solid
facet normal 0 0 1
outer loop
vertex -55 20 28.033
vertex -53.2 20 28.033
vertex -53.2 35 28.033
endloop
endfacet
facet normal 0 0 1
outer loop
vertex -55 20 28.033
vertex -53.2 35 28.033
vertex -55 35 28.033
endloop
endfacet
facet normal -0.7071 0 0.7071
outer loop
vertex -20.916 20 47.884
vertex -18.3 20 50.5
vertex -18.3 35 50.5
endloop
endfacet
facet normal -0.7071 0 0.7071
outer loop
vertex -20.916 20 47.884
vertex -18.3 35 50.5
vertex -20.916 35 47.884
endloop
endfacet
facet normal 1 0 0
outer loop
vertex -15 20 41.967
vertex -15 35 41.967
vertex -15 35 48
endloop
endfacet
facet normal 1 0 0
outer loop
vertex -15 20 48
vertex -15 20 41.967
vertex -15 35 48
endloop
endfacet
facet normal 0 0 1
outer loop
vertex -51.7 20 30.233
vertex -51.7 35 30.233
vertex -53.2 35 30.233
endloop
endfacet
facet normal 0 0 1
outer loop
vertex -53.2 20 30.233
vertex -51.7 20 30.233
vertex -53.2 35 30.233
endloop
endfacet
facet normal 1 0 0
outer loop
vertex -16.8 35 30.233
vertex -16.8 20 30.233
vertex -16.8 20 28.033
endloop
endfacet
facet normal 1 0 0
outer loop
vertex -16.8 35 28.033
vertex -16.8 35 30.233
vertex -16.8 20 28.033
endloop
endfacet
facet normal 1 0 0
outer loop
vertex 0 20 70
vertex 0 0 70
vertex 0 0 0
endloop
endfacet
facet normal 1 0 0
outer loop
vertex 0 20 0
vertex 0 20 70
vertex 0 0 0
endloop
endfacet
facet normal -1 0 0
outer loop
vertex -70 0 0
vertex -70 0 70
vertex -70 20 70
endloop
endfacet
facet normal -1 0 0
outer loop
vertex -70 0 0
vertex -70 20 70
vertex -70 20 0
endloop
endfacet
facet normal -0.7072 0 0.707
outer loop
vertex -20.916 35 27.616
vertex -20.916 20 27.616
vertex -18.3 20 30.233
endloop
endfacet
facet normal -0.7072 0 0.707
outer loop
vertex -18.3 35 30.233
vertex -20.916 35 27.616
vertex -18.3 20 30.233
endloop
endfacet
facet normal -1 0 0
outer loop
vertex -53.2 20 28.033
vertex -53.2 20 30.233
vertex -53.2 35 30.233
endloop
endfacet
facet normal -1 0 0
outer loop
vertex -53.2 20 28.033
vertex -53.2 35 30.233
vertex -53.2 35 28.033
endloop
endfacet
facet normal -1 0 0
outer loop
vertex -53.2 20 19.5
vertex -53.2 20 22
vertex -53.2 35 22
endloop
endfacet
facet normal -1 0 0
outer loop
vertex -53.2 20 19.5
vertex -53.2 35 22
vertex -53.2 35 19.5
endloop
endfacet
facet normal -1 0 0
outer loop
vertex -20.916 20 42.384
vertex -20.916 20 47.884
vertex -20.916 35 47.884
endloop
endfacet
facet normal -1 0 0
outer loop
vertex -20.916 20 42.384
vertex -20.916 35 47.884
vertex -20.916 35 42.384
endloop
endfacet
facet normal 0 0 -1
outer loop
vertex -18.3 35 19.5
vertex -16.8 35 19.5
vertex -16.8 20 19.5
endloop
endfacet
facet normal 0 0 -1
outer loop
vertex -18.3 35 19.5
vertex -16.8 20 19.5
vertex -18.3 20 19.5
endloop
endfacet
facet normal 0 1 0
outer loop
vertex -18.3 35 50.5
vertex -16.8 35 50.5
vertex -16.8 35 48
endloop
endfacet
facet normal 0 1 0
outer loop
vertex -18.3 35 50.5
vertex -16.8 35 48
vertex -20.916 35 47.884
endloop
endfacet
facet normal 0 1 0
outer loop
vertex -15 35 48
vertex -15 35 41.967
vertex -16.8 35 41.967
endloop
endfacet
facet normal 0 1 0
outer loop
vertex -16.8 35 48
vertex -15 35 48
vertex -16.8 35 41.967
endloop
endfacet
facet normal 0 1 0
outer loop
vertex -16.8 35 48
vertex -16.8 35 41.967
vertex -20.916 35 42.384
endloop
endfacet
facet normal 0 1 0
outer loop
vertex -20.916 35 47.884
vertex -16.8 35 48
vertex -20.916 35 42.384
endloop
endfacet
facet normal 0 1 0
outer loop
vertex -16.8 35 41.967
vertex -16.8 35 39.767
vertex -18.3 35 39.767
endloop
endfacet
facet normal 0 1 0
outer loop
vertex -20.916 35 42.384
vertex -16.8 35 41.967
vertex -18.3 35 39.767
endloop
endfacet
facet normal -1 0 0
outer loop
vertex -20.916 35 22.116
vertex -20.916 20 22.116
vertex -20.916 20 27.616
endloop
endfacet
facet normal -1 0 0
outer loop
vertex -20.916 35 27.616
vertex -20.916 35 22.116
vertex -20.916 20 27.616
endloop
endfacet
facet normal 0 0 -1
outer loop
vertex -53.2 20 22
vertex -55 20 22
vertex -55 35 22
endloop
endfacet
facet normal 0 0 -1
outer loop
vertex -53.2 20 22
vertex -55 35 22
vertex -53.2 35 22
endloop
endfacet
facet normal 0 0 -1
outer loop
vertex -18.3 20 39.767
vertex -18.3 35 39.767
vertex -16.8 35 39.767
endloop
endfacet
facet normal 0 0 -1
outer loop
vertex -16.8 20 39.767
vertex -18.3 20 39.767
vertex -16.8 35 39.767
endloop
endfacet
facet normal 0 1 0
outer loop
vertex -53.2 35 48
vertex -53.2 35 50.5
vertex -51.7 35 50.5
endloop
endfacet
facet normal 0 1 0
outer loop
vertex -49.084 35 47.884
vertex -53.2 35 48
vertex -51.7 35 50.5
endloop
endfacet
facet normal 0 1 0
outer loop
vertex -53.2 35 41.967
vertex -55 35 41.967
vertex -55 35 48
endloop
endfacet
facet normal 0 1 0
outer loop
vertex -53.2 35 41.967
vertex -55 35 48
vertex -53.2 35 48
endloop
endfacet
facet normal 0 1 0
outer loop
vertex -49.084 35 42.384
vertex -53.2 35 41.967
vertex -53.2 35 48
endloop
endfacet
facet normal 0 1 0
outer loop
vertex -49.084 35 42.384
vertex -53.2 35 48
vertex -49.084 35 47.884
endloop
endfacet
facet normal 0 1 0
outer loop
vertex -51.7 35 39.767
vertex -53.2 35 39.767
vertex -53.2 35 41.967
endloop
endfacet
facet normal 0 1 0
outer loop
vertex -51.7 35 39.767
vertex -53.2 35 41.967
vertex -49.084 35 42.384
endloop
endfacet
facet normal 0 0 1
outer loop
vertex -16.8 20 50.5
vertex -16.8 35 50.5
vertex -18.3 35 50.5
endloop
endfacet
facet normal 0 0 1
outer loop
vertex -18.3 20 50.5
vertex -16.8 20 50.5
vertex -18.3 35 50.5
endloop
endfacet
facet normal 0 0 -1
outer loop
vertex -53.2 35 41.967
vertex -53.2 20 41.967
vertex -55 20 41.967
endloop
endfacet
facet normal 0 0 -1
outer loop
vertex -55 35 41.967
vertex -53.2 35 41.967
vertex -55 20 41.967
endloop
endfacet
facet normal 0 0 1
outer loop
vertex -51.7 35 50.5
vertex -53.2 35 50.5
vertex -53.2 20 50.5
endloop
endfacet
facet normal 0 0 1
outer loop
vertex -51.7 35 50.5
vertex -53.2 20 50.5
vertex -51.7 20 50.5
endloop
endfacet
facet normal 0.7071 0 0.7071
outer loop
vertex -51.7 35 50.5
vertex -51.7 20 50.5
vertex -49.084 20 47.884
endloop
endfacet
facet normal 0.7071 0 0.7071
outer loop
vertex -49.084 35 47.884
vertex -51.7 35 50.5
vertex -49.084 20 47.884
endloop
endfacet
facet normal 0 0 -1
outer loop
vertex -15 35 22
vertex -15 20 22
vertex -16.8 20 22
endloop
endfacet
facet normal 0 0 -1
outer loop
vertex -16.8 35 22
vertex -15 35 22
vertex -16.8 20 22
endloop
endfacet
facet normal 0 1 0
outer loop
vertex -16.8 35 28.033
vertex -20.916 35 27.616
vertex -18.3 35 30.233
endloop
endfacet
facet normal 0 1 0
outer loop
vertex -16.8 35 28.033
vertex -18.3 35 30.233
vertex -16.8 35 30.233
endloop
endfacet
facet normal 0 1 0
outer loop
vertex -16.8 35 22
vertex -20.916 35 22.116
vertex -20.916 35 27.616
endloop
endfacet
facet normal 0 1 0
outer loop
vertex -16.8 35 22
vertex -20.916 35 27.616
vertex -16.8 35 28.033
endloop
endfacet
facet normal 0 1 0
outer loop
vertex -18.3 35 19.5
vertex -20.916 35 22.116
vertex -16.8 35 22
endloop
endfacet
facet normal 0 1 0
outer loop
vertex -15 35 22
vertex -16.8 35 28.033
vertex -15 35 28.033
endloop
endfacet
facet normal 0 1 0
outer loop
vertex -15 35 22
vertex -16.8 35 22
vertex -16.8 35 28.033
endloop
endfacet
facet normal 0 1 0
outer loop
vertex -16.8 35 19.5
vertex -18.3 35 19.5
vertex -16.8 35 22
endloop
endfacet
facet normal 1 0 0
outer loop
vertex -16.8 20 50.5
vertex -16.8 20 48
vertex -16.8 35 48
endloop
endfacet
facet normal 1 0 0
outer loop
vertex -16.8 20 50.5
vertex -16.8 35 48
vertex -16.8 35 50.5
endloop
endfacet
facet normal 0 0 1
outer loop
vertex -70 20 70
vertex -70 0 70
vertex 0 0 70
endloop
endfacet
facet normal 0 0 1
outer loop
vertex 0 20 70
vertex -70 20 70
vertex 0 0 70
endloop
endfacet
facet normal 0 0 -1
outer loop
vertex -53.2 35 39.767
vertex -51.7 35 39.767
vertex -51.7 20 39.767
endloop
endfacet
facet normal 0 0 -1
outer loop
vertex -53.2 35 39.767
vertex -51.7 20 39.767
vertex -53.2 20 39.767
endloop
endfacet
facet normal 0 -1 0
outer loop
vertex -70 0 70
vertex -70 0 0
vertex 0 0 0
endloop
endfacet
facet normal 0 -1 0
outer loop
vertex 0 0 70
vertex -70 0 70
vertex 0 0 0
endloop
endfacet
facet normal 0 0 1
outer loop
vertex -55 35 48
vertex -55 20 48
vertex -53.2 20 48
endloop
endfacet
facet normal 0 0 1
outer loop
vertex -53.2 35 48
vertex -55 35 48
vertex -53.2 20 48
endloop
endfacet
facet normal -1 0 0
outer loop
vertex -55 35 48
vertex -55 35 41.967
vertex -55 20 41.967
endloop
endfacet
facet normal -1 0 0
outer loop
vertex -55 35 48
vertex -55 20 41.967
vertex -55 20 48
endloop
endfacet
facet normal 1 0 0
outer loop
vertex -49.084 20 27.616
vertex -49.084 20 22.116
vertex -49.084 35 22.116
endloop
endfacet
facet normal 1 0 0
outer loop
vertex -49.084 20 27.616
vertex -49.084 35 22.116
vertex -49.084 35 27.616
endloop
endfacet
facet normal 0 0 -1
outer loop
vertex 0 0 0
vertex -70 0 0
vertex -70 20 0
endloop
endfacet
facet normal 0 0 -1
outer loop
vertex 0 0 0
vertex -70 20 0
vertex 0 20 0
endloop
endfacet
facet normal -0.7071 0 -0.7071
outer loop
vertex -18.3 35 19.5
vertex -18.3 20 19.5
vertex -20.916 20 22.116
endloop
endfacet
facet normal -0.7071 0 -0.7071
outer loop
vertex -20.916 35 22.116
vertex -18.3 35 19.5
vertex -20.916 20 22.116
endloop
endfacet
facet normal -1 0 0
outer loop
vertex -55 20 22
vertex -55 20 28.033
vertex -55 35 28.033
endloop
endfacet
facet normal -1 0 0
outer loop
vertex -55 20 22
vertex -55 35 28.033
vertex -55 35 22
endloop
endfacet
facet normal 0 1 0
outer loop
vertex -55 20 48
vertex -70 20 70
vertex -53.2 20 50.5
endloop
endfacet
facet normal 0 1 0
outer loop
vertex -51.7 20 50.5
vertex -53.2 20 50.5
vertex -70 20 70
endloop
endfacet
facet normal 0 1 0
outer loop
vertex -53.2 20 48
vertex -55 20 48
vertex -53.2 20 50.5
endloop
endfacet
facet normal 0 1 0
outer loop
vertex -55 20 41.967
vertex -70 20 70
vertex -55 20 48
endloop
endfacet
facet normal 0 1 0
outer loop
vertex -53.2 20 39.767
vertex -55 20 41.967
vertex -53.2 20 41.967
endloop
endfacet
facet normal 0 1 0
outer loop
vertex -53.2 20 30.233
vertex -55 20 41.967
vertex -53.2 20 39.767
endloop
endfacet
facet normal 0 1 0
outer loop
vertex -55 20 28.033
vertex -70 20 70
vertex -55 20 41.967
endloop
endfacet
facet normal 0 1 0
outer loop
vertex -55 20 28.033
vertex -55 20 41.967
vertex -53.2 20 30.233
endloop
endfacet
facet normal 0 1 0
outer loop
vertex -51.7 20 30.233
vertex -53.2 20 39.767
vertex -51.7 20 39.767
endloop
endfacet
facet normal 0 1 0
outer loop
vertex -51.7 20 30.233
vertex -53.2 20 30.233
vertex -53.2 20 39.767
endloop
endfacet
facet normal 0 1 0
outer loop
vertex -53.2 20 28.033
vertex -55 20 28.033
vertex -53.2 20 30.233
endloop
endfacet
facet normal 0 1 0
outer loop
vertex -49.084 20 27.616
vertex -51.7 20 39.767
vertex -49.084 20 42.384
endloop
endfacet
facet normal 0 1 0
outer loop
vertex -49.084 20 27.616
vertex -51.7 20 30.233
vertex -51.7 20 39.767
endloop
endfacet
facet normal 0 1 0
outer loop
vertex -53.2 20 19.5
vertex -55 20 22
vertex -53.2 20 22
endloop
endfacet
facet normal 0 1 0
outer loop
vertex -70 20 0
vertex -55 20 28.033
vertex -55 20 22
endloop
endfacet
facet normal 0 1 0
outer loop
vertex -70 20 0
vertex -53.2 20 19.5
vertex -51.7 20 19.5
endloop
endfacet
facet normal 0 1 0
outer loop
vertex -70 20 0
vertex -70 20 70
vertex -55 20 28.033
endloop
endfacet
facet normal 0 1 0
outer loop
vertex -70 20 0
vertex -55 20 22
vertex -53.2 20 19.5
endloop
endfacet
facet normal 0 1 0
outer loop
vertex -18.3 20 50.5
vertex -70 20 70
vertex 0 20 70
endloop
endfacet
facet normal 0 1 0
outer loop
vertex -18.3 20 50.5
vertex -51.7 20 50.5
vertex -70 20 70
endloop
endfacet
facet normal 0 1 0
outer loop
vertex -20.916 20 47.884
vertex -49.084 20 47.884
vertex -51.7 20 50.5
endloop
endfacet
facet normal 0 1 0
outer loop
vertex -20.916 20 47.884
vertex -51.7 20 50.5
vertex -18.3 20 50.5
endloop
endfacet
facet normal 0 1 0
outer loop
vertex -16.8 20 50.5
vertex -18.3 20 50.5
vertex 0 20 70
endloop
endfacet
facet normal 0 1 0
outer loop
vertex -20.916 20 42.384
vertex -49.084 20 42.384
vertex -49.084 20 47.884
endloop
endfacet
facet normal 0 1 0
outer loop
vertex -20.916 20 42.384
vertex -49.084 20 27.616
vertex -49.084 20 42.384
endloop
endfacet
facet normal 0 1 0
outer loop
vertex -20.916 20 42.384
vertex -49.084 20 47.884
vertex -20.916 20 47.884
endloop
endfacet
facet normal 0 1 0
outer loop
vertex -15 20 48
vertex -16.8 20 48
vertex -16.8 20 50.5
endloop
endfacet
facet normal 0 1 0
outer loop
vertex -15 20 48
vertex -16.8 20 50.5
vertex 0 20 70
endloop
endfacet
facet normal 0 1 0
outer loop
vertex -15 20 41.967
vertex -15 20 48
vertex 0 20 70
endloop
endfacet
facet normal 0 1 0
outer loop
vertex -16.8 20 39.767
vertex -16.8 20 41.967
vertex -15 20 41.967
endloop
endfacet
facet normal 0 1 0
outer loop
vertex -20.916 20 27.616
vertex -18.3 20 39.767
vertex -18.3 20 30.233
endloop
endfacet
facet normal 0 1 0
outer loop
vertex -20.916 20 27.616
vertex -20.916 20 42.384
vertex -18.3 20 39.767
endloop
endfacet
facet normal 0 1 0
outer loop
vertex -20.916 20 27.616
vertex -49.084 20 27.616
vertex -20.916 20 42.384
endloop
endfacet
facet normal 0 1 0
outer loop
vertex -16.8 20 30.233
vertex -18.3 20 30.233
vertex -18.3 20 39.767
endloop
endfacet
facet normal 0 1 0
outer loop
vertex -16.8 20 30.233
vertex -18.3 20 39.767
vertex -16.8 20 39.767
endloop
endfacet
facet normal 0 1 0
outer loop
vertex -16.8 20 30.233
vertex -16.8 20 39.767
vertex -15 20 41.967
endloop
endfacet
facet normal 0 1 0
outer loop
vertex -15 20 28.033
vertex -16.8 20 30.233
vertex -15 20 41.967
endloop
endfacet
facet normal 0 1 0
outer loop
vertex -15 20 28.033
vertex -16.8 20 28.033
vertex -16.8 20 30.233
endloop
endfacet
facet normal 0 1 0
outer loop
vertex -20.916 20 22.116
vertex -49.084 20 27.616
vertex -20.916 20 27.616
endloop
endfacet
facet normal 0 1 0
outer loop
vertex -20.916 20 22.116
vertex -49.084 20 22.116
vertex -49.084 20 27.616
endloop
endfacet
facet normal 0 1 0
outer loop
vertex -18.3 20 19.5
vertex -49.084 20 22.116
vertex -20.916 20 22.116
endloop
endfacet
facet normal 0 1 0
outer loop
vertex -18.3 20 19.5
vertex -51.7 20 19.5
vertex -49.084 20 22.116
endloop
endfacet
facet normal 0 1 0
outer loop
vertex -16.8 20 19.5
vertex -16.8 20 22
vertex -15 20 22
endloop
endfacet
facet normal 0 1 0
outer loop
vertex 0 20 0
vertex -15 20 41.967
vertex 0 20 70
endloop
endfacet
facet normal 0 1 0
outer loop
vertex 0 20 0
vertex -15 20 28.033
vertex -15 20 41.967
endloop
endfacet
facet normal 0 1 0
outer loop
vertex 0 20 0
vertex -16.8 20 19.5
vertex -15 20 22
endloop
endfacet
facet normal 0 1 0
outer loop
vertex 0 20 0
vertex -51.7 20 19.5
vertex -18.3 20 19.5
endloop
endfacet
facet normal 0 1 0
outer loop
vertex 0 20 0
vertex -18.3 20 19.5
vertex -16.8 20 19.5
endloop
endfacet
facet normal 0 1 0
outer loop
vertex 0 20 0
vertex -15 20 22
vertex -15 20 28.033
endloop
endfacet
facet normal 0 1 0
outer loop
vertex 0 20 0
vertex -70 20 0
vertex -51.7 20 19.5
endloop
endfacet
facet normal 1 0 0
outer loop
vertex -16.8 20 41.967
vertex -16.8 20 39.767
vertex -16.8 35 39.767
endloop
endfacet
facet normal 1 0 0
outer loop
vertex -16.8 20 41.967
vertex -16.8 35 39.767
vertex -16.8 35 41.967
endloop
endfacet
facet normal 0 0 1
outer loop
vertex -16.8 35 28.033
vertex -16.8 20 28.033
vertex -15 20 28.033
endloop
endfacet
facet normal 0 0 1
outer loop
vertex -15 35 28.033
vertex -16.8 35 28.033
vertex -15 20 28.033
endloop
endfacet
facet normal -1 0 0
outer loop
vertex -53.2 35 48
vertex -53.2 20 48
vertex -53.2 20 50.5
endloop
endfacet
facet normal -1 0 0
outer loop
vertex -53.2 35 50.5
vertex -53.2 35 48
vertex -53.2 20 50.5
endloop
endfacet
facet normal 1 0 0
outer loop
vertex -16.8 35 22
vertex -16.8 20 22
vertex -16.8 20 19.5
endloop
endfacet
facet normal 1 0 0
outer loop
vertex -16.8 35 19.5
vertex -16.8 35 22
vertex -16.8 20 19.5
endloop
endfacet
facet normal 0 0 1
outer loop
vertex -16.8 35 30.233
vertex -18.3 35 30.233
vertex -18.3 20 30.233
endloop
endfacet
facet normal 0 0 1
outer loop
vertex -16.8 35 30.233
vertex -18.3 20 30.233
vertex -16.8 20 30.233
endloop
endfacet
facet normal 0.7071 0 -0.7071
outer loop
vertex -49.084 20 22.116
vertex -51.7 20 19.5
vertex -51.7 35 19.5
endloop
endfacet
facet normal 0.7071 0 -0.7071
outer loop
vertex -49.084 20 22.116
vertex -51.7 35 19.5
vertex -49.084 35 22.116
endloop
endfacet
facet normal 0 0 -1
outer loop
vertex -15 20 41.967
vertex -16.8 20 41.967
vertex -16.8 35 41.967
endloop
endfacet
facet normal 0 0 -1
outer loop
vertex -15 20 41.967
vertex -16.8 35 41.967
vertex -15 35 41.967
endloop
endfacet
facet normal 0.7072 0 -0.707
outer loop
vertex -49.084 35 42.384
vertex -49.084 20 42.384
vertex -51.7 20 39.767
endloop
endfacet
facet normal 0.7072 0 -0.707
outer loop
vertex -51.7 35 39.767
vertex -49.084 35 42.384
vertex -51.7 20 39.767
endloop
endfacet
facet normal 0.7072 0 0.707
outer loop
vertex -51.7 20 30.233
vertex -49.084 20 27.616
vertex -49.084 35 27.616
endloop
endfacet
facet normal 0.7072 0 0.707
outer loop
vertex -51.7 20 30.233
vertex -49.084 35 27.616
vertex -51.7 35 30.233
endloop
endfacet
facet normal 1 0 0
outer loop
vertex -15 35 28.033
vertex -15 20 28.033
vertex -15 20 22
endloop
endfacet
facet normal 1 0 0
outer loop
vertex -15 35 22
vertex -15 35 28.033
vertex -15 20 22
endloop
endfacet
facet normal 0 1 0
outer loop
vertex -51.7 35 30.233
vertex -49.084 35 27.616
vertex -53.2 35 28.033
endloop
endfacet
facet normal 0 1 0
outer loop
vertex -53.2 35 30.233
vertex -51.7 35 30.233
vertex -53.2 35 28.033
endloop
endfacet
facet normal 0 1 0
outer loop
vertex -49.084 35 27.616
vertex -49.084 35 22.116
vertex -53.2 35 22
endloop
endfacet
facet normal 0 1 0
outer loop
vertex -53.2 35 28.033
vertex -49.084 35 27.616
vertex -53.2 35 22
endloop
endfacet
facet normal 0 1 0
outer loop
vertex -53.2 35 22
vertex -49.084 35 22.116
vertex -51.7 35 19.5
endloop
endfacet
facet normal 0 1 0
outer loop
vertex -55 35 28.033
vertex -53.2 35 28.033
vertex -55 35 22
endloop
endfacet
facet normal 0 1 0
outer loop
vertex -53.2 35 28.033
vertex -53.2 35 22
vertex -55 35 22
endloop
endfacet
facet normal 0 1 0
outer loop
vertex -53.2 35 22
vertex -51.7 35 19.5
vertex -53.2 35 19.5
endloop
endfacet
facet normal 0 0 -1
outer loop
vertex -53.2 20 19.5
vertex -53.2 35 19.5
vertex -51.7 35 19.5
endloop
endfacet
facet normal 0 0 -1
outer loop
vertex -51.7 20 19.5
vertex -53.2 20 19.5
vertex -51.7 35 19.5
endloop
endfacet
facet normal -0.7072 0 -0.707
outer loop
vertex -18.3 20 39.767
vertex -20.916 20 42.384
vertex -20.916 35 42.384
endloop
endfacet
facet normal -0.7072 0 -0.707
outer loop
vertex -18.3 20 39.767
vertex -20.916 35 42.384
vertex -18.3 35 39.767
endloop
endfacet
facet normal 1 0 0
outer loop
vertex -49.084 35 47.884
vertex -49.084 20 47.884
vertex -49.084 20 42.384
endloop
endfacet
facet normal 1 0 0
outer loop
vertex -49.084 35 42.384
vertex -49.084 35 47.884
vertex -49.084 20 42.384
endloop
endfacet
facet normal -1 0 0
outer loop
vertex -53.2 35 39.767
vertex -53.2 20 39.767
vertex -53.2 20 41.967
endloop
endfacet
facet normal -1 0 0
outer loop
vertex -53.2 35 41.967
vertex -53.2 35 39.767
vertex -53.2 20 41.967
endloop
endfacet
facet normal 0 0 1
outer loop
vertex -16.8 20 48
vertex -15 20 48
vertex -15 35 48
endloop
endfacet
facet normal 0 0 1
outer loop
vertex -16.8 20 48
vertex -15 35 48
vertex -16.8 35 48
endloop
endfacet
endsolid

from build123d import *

# Parameters (mm, degrees)
SKETCH1_W           = 70
SKETCH1_H           = 70
BOSS_EXTRUDE1_DEPTH = 20
BOSS_EXTRUDE3_DEPTH = 15


with BuildPart() as part:
    # Sketch1 → Boss-Extrude1 (new body)
    with BuildSketch(Plane(origin=(0, 0, 0), x_dir=(1, 0, 0), z_dir=(0, 1, 0))):
        with Locations((-35, -35)):
            Rectangle(SKETCH1_W, SKETCH1_H)
    extrude(amount=BOSS_EXTRUDE1_DEPTH)

    # Sketch2 → Boss-Extrude3 (add)
    with BuildSketch(Plane(origin=(0, 20, 0), x_dir=(1, 0, 0), z_dir=(0, 1, 0))):
        Polygon((-55, -22), (-53.2, -22), (-53.2, -19.5), (-51.7, -19.5), (-49.08370491, -22.11629509), (-49.08370491, -27.61629509), (-51.7, -30.232590181), (-53.2, -30.232590181), (-53.2, -28.032590181), (-55, -28.032590181), align=None)
        Polygon((-16.8, -28.032590181), (-15, -28.032590181), (-15, -22), (-16.8, -22), (-16.8, -19.5), (-18.3, -19.5), (-20.91629509, -22.11629509), (-20.91629509, -27.61629509), (-18.3, -30.232590181), (-16.8, -30.232590181), align=None)
        Polygon((-53.2, -41.967409819), (-55, -41.967409819), (-55, -48), (-53.2, -48), (-53.2, -50.5), (-51.7, -50.5), (-49.08370491, -47.88370491), (-49.08370491, -42.38370491), (-51.7, -39.767409819), (-53.2, -39.767409819), align=None)
        Polygon((-16.8, -39.767409819), (-16.8, -41.967409819), (-15, -41.967409819), (-15, -48), (-16.8, -48), (-16.8, -50.5), (-18.3, -50.5), (-20.91629509, -47.88370491), (-20.91629509, -42.38370491), (-18.3, -39.767409819), align=None)
    extrude(amount=BOSS_EXTRUDE3_DEPTH)


solid = part.part
